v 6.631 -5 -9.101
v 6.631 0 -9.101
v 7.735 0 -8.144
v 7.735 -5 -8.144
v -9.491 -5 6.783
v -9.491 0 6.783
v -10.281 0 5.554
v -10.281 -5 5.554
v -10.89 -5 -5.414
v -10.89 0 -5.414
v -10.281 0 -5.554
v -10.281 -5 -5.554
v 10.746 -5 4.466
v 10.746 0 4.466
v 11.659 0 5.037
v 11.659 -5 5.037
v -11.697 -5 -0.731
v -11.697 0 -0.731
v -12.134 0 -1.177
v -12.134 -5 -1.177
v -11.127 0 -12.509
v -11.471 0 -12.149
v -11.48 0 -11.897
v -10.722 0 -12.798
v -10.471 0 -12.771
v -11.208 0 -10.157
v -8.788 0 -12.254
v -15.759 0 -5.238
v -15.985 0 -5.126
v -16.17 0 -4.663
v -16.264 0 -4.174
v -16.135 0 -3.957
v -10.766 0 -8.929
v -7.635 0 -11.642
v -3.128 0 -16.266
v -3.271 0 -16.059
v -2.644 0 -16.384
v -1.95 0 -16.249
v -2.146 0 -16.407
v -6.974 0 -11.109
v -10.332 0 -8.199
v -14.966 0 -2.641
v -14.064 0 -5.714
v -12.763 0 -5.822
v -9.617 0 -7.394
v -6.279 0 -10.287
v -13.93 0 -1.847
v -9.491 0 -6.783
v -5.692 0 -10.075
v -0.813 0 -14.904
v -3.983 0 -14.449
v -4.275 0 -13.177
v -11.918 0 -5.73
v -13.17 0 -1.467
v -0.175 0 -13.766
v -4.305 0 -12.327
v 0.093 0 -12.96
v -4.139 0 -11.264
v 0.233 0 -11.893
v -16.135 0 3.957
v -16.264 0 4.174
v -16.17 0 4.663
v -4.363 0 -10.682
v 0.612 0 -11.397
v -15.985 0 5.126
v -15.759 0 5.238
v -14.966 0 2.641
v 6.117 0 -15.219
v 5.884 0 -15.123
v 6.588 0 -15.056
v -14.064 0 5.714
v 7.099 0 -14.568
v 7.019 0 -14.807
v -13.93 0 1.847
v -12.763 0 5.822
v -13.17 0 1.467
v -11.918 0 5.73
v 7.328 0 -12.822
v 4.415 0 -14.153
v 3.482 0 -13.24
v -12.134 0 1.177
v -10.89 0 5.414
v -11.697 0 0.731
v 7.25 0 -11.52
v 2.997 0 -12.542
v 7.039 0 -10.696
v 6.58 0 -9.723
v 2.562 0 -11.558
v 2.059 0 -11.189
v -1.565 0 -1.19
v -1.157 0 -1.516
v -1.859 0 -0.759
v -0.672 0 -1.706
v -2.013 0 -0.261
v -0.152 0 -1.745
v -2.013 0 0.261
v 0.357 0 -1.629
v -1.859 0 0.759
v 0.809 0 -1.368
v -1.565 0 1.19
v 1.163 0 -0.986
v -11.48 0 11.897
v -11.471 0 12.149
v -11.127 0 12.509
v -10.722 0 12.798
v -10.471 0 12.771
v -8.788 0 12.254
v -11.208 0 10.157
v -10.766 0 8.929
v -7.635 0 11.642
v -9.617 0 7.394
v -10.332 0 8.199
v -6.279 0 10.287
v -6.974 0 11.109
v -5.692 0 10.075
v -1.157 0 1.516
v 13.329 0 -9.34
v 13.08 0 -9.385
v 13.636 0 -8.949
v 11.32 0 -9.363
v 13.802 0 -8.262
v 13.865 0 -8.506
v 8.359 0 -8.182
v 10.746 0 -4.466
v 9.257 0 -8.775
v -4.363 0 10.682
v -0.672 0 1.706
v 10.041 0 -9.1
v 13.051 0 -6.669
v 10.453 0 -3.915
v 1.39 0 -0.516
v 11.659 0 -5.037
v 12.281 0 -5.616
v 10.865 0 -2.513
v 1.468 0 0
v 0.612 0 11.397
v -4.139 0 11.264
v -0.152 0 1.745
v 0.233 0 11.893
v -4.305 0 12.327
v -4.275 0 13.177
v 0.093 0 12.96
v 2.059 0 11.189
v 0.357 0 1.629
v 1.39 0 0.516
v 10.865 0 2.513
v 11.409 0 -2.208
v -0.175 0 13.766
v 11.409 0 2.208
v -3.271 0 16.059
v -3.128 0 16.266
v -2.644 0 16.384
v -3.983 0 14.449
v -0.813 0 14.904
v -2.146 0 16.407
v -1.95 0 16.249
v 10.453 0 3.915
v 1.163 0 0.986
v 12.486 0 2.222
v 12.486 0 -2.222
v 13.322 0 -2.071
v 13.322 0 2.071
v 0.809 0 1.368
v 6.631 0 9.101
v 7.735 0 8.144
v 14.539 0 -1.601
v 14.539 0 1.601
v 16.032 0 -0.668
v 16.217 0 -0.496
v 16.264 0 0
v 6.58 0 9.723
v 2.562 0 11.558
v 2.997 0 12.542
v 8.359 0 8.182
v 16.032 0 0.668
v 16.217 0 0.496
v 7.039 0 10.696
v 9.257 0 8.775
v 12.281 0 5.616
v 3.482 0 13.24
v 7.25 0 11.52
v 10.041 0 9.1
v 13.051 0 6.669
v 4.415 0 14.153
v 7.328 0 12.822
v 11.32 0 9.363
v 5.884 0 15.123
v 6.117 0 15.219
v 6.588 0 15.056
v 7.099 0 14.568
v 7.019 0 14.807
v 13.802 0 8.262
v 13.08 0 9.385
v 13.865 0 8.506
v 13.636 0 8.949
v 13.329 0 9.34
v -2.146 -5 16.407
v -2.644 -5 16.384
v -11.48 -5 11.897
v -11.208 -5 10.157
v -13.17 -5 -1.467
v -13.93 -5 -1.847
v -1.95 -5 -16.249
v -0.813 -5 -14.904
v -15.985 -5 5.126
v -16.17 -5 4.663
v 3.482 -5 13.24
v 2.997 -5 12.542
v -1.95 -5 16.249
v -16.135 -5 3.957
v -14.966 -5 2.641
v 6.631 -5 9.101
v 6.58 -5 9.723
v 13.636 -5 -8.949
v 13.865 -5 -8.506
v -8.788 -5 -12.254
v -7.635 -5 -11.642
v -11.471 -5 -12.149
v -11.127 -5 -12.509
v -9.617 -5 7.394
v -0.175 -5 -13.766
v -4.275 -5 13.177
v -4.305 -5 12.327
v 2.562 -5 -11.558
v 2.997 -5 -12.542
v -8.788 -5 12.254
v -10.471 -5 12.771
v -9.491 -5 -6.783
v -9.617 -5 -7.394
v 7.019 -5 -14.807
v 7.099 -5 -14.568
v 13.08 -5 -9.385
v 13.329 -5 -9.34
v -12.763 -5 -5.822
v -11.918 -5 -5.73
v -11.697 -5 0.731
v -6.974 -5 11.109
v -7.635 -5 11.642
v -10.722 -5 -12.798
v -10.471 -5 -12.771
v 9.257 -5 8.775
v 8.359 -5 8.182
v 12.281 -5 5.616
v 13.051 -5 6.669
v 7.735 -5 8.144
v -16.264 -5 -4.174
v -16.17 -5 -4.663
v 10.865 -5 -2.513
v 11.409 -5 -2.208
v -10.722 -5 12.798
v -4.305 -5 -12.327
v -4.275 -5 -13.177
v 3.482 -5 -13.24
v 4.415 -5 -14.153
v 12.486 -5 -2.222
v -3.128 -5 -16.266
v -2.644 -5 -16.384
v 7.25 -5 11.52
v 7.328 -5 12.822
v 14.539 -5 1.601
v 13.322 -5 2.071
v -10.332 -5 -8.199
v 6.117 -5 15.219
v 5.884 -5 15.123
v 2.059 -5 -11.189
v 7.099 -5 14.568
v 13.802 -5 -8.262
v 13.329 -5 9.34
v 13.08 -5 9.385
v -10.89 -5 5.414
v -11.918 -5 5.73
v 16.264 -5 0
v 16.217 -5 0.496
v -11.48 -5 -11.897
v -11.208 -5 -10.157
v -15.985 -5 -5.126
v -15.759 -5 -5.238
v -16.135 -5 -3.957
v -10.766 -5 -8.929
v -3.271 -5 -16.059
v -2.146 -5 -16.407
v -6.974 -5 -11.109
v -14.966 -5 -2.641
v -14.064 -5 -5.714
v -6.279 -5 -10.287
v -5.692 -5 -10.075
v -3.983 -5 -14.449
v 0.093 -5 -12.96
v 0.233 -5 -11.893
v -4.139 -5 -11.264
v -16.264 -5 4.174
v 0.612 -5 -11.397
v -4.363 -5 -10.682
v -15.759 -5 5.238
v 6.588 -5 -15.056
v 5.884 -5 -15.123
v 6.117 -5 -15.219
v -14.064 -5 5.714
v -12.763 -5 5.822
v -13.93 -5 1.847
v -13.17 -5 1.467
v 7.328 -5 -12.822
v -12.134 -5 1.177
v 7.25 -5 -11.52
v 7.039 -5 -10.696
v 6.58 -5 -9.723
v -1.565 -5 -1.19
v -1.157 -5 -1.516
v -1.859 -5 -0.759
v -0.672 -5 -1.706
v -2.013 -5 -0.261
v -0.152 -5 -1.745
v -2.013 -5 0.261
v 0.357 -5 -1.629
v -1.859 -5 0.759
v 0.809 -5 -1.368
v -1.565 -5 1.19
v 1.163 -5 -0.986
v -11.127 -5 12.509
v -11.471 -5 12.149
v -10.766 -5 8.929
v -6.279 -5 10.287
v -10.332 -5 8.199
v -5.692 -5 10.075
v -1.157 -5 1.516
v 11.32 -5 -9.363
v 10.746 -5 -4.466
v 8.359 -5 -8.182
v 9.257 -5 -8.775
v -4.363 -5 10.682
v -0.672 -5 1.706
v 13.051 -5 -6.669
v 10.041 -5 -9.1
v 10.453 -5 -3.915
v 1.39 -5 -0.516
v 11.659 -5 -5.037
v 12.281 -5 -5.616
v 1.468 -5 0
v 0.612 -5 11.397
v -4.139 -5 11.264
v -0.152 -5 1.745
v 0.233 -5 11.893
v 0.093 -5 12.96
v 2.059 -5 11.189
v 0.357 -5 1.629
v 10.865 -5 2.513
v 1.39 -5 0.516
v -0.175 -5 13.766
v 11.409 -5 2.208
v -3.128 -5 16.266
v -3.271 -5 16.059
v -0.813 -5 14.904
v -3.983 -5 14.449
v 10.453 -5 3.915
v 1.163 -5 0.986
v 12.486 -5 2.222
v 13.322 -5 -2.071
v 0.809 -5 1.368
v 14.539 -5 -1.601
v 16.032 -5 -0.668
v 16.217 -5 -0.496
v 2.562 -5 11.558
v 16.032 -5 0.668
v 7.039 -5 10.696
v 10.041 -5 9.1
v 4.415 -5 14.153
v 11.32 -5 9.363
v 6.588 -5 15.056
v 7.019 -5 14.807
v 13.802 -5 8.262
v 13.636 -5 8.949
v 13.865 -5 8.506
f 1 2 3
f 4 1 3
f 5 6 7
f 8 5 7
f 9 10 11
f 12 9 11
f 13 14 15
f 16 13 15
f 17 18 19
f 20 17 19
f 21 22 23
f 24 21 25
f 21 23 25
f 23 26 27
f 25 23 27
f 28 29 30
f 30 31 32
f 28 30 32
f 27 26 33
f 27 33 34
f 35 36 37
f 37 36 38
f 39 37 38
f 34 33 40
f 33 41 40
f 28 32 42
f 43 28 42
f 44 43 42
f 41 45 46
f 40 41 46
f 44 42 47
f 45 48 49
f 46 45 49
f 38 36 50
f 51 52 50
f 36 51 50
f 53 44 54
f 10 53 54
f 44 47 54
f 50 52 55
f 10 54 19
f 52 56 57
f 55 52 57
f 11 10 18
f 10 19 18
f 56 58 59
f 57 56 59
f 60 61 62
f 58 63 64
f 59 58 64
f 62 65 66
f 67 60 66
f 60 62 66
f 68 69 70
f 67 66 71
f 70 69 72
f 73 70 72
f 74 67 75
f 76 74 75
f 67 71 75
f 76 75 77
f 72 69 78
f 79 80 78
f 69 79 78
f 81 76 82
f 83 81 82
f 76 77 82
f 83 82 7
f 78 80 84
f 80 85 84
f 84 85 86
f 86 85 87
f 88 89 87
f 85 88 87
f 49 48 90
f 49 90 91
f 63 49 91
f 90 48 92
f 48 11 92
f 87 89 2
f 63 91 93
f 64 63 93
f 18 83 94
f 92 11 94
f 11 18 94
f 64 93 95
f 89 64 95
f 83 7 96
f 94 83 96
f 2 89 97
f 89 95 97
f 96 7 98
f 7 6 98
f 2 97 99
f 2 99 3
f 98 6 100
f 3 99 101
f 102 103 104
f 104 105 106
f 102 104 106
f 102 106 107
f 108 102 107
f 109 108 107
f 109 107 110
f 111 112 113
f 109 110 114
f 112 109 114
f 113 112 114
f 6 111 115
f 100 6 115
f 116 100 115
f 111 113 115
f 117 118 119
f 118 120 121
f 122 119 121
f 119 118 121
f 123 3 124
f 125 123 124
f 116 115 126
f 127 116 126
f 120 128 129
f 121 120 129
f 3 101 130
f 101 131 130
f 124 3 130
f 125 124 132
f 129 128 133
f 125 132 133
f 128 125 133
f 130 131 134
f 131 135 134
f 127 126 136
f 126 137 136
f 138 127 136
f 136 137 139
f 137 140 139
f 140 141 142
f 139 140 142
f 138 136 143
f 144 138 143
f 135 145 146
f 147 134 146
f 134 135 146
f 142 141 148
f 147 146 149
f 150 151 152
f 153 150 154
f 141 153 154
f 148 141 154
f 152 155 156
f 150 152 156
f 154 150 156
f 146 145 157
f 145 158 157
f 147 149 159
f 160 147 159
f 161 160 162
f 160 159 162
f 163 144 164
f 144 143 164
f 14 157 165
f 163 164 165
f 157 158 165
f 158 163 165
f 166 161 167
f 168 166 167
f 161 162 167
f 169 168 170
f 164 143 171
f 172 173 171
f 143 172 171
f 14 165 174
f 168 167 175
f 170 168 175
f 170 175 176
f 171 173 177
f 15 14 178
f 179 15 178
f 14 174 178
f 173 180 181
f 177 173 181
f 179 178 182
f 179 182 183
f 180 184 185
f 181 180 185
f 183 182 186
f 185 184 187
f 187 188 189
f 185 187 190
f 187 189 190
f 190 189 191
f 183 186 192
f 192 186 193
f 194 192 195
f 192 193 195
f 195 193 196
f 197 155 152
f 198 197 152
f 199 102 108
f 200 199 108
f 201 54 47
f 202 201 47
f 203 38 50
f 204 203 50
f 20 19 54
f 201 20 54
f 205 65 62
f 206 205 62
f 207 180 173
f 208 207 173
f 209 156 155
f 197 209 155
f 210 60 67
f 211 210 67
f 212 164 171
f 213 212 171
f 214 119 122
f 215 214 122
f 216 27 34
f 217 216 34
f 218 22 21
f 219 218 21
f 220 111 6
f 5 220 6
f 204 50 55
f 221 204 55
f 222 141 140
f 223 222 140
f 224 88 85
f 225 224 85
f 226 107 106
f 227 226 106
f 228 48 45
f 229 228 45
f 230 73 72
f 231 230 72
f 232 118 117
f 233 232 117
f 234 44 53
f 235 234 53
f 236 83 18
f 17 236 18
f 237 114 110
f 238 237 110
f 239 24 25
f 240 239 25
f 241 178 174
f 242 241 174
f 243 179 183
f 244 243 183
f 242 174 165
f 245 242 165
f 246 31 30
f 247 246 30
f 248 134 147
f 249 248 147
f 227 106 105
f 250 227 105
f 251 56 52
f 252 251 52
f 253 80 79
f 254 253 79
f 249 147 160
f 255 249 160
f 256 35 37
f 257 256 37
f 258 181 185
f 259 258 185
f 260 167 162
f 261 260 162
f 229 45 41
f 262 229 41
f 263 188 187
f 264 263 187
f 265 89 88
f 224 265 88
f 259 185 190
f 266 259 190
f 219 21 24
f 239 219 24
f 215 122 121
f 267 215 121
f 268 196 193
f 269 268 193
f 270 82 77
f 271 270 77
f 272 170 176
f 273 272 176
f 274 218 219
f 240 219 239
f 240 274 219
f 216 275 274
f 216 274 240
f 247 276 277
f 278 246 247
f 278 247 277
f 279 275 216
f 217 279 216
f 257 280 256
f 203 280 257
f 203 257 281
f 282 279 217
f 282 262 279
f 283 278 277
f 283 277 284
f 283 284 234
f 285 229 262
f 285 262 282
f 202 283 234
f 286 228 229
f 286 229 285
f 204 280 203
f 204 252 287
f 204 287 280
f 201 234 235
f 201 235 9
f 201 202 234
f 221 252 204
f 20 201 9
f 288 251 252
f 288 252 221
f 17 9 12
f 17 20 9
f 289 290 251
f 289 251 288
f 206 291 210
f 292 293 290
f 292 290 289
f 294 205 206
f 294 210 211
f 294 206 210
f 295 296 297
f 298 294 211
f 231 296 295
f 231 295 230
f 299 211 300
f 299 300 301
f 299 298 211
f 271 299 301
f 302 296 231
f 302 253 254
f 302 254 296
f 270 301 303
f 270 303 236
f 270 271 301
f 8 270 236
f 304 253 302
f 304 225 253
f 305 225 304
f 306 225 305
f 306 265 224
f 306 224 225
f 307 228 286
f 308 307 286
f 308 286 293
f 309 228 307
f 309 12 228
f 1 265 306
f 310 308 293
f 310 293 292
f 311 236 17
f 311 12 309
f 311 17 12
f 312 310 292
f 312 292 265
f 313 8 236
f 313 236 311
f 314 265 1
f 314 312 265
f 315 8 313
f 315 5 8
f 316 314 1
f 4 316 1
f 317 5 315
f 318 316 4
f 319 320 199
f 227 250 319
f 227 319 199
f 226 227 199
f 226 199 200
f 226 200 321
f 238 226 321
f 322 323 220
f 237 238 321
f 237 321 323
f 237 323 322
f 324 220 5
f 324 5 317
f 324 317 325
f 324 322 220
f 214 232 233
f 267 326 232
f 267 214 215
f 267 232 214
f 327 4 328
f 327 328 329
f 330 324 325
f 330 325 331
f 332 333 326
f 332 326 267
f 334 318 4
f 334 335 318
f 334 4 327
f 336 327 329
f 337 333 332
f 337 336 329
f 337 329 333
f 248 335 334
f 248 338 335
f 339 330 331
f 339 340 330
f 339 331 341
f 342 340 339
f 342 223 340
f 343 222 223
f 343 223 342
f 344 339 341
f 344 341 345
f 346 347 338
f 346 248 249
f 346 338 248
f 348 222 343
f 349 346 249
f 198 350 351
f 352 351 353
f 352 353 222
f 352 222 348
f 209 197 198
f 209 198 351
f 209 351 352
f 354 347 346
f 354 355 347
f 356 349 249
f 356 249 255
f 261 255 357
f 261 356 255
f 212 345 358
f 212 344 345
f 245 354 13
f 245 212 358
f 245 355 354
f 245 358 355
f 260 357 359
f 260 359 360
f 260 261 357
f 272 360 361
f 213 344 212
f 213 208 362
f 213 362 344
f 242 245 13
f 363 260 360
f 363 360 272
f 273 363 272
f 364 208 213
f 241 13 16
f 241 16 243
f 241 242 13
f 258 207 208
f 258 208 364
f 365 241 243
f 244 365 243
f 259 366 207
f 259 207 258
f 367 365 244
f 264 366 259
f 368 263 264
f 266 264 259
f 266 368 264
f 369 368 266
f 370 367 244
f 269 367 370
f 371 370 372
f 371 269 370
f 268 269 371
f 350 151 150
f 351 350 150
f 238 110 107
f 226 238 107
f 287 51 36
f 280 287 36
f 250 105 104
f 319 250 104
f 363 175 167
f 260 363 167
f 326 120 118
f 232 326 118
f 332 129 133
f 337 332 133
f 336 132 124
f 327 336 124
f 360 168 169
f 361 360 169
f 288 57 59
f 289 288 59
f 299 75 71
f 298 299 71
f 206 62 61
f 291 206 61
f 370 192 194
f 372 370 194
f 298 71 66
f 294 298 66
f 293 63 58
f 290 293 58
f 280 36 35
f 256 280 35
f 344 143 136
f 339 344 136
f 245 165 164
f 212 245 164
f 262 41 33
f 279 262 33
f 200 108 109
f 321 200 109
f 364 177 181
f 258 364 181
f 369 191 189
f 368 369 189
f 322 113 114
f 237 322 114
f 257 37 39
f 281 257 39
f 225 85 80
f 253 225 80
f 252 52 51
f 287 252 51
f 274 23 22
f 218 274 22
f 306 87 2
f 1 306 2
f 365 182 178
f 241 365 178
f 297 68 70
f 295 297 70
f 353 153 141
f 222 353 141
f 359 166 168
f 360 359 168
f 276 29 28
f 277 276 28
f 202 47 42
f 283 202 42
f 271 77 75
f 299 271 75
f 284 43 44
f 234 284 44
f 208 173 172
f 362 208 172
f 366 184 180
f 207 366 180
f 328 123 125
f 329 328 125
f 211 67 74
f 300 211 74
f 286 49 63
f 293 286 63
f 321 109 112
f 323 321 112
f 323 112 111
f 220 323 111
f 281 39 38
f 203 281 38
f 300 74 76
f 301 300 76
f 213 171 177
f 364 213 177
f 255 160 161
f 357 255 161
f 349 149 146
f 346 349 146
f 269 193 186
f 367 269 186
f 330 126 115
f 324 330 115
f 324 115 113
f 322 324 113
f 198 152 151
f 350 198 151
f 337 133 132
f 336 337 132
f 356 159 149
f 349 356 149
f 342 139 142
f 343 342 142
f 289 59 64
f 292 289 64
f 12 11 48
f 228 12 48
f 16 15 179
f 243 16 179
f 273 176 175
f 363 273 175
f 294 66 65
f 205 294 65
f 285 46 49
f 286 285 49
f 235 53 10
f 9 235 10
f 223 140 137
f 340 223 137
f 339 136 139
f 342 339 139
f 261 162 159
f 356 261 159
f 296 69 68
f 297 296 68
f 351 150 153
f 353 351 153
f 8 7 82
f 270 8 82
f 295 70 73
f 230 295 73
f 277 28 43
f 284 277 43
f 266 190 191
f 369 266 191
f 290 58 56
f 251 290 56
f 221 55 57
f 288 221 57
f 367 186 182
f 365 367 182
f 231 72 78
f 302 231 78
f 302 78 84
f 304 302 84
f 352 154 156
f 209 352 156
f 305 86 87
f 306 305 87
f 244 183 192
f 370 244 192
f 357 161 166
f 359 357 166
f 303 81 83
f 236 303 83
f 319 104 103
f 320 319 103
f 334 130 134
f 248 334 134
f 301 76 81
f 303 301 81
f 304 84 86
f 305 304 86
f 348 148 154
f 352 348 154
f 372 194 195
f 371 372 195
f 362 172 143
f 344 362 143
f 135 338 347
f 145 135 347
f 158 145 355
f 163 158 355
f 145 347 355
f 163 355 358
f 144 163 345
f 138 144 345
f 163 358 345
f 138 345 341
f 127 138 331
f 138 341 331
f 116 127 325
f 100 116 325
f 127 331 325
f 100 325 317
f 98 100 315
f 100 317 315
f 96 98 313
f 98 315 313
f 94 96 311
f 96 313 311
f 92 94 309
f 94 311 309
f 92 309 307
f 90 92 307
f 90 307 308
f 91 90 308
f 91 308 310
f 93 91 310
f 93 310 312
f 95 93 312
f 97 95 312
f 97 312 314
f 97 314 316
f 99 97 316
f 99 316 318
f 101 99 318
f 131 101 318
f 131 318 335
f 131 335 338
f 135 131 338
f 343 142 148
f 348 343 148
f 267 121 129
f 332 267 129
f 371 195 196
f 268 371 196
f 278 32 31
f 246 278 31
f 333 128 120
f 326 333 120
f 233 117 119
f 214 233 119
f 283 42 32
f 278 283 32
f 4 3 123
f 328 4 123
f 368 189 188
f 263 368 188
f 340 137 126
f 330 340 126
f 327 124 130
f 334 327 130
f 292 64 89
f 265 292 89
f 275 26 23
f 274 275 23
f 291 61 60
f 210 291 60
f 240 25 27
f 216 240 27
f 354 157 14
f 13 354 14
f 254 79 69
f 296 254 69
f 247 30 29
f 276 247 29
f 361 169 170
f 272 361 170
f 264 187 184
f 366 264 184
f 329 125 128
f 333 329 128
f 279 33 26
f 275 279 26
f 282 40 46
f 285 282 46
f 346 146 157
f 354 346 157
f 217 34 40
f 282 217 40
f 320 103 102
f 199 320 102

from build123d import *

# Parameters (mm, degrees)
F1_DEPTH = 5
F2_R     = 1.75
F3_DEPTH = 25


with BuildPart() as f1:
    # F0 (on Front) → F1 (new body)
    with BuildSketch(Plane.XZ):
        Polygon((-15.759088, 5.238458), (-15.984615, 5.125695), (-16.169742, 4.663269), (-16.264009, 4.174165), (-16.135249, 3.957374), (-14.96593, 2.641114), (-13.930142, 1.847068), (-13.170214, 1.467105), (-12.134025, 1.176704), (-11.697261, 0.730628), (-11.697261, -0.730628), (-12.134025, -1.176704), (-13.170214, -1.467105), (-13.930142, -1.847068), (-14.96593, -2.641114), (-16.135249, -3.957374), (-16.264009, -4.174165), (-16.169742, -4.663269), (-15.984615, -5.125695), (-15.759088, -5.238458), (-14.063771, -5.713585), (-12.763117, -5.821589), (-11.918401, -5.730387), (-10.889701, -5.414481), (-10.281105, -5.553612), (-9.49109, -6.782899), (-9.617352, -7.394294), (-10.332048, -8.198801), (-10.765916, -8.929295), (-11.207983, -10.157278), (-11.480053, -11.896767), (-11.471167, -12.148757), (-11.127434, -12.509253), (-10.721689, -12.798183), (-10.471, -12.771117), (-8.787936, -12.254261), (-7.635364, -11.641933), (-6.974052, -11.108521), (-6.279446, -10.286607), (-5.692242, -10.074619), (-4.363037, -10.681647), (-4.13871, -11.264248), (-4.305001, -12.327436), (-4.275059, -13.176533), (-3.983052, -14.448578), (-3.271493, -16.059021), (-3.127781, -16.266204), (-2.643716, -16.383637), (-2.146174, -16.407338), (-1.949914, -16.249036), (-0.813464, -14.904296), (-0.174908, -13.766046), (0.093039, -12.959779), (0.233018, -11.892808), (0.612396, -11.397006), (2.058779, -11.189048), (2.562472, -11.557883), (2.997382, -12.542197), (3.481627, -13.240315), (4.414999, -14.152556), (5.884272, -15.12265), (6.117181, -15.219247), (6.587892, -15.056333), (7.019264, -14.80728), (7.098784, -14.568001), (7.327805, -12.822322), (7.249608, -11.519536), (7.039119, -10.696398), (6.580029, -9.723126), (6.631132, -9.100924), (7.735475, -8.144005), (8.358617, -8.181972), (9.256646, -8.774899), (10.041451, -9.100391), (11.319848, -9.363198), (13.080351, -9.384944), (13.328511, -9.340286), (13.63642, -8.948748), (13.864665, -8.506014), (13.802197, -8.261728), (13.051077, -6.669352), (12.280954, -5.615655), (11.658857, -5.036986), (10.746456, -4.466421), (10.453058, -3.915363), (10.864742, -2.513298), (11.409488, -2.208342), (12.48552, -2.221633), (13.321713, -2.071157), (14.539253, -1.60109), (16.032039, -0.667584), (16.216661, -0.495851), (16.264009, 0), (16.216661, 0.495851), (16.032039, 0.667584), (14.539253, 1.60109), (13.321713, 2.071157), (12.48552, 2.221633), (11.409488, 2.208342), (10.864742, 2.513298), (10.453058, 3.915363), (10.746456, 4.466421), (11.658857, 5.036986), (12.280954, 5.615655), (13.051077, 6.669352), (13.802197, 8.261728), (13.864665, 8.506014), (13.63642, 8.948748), (13.328511, 9.340286), (13.080351, 9.384944), (11.319848, 9.363198), (10.041451, 9.100391), (9.256646, 8.774899), (8.358617, 8.181972), (7.735475, 8.144005), (6.631132, 9.100924), (6.580029, 9.723126), (7.039119, 10.696398), (7.249608, 11.519536), (7.327805, 12.822322), (7.098784, 14.568001), (7.019264, 14.80728), (6.587892, 15.056333), (6.117181, 15.219247), (5.884272, 15.12265), (4.414999, 14.152556), (3.481627, 13.240315), (2.997382, 12.542197), (2.562472, 11.557883), (2.058779, 11.189048), (0.612396, 11.397006), (0.233018, 11.892808), (0.093039, 12.959779), (-0.174908, 13.766046), (-0.813464, 14.904296), (-1.949914, 16.249036), (-2.146174, 16.407338), (-2.643716, 16.383637), (-3.127781, 16.266204), (-3.271493, 16.059021), (-3.983052, 14.448578), (-4.275059, 13.176533), (-4.305001, 12.327436), (-4.13871, 11.264248), (-4.363037, 10.681647), (-5.692242, 10.074619), (-6.279446, 10.286607), (-6.974052, 11.108521), (-7.635364, 11.641933), (-8.787936, 12.254261), (-10.471, 12.771117), (-10.721689, 12.798183), (-11.127434, 12.509253), (-11.471167, 12.148757), (-11.480053, 11.896767), (-11.207983, 10.157278), (-10.765916, 8.929295), (-10.332048, 8.198801), (-9.617352, 7.394294), (-9.49109, 6.782899), (-10.281105, 5.553612), (-10.889701, 5.414481), (-11.918401, 5.730387), (-12.763117, 5.821589), (-14.063771, 5.713585), align=None)
        Polygon((-1.27575, 1.161973), (-1.01258, 1.341924), (-0.717747, 1.463227), (-0.404136, 1.520579), (-0.085455, 1.511475), (0.22437, 1.436313), (0.511798, 1.298376), (0.764266, 1.103694), (0.97074, 0.860776), (1.122196, 0.580237), (1.212016, 0.27434), (1.236273, -0.043548), (1.193908, -0.359532), (1.086771, -0.659803), (0.919546, -0.931238), (0.699541, -1.161973), (0.436371, -1.341924), (0.141537, -1.463227), (-0.172073, -1.520579), (-0.490755, -1.511475), (-0.80058, -1.436313), (-1.088008, -1.298376), (-1.340475, -1.103694), (-1.546949, -0.860776), (-1.698406, -0.580237), (-1.788226, -0.27434), (-1.812483, 0.043548), (-1.770117, 0.359532), (-1.662981, 0.659803), (-1.495756, 0.931238), align=None, mode=Mode.SUBTRACT)
    extrude(amount=F1_DEPTH)

    # F2 (on face) → F3 (cut)
    with BuildSketch(Plane.XZ.offset(5)):
        with Locations((-0.282437, 0)):
            Circle(F2_R)
    extrude(amount=-F3_DEPTH, mode=Mode.SUBTRACT)


solid = f1.part
